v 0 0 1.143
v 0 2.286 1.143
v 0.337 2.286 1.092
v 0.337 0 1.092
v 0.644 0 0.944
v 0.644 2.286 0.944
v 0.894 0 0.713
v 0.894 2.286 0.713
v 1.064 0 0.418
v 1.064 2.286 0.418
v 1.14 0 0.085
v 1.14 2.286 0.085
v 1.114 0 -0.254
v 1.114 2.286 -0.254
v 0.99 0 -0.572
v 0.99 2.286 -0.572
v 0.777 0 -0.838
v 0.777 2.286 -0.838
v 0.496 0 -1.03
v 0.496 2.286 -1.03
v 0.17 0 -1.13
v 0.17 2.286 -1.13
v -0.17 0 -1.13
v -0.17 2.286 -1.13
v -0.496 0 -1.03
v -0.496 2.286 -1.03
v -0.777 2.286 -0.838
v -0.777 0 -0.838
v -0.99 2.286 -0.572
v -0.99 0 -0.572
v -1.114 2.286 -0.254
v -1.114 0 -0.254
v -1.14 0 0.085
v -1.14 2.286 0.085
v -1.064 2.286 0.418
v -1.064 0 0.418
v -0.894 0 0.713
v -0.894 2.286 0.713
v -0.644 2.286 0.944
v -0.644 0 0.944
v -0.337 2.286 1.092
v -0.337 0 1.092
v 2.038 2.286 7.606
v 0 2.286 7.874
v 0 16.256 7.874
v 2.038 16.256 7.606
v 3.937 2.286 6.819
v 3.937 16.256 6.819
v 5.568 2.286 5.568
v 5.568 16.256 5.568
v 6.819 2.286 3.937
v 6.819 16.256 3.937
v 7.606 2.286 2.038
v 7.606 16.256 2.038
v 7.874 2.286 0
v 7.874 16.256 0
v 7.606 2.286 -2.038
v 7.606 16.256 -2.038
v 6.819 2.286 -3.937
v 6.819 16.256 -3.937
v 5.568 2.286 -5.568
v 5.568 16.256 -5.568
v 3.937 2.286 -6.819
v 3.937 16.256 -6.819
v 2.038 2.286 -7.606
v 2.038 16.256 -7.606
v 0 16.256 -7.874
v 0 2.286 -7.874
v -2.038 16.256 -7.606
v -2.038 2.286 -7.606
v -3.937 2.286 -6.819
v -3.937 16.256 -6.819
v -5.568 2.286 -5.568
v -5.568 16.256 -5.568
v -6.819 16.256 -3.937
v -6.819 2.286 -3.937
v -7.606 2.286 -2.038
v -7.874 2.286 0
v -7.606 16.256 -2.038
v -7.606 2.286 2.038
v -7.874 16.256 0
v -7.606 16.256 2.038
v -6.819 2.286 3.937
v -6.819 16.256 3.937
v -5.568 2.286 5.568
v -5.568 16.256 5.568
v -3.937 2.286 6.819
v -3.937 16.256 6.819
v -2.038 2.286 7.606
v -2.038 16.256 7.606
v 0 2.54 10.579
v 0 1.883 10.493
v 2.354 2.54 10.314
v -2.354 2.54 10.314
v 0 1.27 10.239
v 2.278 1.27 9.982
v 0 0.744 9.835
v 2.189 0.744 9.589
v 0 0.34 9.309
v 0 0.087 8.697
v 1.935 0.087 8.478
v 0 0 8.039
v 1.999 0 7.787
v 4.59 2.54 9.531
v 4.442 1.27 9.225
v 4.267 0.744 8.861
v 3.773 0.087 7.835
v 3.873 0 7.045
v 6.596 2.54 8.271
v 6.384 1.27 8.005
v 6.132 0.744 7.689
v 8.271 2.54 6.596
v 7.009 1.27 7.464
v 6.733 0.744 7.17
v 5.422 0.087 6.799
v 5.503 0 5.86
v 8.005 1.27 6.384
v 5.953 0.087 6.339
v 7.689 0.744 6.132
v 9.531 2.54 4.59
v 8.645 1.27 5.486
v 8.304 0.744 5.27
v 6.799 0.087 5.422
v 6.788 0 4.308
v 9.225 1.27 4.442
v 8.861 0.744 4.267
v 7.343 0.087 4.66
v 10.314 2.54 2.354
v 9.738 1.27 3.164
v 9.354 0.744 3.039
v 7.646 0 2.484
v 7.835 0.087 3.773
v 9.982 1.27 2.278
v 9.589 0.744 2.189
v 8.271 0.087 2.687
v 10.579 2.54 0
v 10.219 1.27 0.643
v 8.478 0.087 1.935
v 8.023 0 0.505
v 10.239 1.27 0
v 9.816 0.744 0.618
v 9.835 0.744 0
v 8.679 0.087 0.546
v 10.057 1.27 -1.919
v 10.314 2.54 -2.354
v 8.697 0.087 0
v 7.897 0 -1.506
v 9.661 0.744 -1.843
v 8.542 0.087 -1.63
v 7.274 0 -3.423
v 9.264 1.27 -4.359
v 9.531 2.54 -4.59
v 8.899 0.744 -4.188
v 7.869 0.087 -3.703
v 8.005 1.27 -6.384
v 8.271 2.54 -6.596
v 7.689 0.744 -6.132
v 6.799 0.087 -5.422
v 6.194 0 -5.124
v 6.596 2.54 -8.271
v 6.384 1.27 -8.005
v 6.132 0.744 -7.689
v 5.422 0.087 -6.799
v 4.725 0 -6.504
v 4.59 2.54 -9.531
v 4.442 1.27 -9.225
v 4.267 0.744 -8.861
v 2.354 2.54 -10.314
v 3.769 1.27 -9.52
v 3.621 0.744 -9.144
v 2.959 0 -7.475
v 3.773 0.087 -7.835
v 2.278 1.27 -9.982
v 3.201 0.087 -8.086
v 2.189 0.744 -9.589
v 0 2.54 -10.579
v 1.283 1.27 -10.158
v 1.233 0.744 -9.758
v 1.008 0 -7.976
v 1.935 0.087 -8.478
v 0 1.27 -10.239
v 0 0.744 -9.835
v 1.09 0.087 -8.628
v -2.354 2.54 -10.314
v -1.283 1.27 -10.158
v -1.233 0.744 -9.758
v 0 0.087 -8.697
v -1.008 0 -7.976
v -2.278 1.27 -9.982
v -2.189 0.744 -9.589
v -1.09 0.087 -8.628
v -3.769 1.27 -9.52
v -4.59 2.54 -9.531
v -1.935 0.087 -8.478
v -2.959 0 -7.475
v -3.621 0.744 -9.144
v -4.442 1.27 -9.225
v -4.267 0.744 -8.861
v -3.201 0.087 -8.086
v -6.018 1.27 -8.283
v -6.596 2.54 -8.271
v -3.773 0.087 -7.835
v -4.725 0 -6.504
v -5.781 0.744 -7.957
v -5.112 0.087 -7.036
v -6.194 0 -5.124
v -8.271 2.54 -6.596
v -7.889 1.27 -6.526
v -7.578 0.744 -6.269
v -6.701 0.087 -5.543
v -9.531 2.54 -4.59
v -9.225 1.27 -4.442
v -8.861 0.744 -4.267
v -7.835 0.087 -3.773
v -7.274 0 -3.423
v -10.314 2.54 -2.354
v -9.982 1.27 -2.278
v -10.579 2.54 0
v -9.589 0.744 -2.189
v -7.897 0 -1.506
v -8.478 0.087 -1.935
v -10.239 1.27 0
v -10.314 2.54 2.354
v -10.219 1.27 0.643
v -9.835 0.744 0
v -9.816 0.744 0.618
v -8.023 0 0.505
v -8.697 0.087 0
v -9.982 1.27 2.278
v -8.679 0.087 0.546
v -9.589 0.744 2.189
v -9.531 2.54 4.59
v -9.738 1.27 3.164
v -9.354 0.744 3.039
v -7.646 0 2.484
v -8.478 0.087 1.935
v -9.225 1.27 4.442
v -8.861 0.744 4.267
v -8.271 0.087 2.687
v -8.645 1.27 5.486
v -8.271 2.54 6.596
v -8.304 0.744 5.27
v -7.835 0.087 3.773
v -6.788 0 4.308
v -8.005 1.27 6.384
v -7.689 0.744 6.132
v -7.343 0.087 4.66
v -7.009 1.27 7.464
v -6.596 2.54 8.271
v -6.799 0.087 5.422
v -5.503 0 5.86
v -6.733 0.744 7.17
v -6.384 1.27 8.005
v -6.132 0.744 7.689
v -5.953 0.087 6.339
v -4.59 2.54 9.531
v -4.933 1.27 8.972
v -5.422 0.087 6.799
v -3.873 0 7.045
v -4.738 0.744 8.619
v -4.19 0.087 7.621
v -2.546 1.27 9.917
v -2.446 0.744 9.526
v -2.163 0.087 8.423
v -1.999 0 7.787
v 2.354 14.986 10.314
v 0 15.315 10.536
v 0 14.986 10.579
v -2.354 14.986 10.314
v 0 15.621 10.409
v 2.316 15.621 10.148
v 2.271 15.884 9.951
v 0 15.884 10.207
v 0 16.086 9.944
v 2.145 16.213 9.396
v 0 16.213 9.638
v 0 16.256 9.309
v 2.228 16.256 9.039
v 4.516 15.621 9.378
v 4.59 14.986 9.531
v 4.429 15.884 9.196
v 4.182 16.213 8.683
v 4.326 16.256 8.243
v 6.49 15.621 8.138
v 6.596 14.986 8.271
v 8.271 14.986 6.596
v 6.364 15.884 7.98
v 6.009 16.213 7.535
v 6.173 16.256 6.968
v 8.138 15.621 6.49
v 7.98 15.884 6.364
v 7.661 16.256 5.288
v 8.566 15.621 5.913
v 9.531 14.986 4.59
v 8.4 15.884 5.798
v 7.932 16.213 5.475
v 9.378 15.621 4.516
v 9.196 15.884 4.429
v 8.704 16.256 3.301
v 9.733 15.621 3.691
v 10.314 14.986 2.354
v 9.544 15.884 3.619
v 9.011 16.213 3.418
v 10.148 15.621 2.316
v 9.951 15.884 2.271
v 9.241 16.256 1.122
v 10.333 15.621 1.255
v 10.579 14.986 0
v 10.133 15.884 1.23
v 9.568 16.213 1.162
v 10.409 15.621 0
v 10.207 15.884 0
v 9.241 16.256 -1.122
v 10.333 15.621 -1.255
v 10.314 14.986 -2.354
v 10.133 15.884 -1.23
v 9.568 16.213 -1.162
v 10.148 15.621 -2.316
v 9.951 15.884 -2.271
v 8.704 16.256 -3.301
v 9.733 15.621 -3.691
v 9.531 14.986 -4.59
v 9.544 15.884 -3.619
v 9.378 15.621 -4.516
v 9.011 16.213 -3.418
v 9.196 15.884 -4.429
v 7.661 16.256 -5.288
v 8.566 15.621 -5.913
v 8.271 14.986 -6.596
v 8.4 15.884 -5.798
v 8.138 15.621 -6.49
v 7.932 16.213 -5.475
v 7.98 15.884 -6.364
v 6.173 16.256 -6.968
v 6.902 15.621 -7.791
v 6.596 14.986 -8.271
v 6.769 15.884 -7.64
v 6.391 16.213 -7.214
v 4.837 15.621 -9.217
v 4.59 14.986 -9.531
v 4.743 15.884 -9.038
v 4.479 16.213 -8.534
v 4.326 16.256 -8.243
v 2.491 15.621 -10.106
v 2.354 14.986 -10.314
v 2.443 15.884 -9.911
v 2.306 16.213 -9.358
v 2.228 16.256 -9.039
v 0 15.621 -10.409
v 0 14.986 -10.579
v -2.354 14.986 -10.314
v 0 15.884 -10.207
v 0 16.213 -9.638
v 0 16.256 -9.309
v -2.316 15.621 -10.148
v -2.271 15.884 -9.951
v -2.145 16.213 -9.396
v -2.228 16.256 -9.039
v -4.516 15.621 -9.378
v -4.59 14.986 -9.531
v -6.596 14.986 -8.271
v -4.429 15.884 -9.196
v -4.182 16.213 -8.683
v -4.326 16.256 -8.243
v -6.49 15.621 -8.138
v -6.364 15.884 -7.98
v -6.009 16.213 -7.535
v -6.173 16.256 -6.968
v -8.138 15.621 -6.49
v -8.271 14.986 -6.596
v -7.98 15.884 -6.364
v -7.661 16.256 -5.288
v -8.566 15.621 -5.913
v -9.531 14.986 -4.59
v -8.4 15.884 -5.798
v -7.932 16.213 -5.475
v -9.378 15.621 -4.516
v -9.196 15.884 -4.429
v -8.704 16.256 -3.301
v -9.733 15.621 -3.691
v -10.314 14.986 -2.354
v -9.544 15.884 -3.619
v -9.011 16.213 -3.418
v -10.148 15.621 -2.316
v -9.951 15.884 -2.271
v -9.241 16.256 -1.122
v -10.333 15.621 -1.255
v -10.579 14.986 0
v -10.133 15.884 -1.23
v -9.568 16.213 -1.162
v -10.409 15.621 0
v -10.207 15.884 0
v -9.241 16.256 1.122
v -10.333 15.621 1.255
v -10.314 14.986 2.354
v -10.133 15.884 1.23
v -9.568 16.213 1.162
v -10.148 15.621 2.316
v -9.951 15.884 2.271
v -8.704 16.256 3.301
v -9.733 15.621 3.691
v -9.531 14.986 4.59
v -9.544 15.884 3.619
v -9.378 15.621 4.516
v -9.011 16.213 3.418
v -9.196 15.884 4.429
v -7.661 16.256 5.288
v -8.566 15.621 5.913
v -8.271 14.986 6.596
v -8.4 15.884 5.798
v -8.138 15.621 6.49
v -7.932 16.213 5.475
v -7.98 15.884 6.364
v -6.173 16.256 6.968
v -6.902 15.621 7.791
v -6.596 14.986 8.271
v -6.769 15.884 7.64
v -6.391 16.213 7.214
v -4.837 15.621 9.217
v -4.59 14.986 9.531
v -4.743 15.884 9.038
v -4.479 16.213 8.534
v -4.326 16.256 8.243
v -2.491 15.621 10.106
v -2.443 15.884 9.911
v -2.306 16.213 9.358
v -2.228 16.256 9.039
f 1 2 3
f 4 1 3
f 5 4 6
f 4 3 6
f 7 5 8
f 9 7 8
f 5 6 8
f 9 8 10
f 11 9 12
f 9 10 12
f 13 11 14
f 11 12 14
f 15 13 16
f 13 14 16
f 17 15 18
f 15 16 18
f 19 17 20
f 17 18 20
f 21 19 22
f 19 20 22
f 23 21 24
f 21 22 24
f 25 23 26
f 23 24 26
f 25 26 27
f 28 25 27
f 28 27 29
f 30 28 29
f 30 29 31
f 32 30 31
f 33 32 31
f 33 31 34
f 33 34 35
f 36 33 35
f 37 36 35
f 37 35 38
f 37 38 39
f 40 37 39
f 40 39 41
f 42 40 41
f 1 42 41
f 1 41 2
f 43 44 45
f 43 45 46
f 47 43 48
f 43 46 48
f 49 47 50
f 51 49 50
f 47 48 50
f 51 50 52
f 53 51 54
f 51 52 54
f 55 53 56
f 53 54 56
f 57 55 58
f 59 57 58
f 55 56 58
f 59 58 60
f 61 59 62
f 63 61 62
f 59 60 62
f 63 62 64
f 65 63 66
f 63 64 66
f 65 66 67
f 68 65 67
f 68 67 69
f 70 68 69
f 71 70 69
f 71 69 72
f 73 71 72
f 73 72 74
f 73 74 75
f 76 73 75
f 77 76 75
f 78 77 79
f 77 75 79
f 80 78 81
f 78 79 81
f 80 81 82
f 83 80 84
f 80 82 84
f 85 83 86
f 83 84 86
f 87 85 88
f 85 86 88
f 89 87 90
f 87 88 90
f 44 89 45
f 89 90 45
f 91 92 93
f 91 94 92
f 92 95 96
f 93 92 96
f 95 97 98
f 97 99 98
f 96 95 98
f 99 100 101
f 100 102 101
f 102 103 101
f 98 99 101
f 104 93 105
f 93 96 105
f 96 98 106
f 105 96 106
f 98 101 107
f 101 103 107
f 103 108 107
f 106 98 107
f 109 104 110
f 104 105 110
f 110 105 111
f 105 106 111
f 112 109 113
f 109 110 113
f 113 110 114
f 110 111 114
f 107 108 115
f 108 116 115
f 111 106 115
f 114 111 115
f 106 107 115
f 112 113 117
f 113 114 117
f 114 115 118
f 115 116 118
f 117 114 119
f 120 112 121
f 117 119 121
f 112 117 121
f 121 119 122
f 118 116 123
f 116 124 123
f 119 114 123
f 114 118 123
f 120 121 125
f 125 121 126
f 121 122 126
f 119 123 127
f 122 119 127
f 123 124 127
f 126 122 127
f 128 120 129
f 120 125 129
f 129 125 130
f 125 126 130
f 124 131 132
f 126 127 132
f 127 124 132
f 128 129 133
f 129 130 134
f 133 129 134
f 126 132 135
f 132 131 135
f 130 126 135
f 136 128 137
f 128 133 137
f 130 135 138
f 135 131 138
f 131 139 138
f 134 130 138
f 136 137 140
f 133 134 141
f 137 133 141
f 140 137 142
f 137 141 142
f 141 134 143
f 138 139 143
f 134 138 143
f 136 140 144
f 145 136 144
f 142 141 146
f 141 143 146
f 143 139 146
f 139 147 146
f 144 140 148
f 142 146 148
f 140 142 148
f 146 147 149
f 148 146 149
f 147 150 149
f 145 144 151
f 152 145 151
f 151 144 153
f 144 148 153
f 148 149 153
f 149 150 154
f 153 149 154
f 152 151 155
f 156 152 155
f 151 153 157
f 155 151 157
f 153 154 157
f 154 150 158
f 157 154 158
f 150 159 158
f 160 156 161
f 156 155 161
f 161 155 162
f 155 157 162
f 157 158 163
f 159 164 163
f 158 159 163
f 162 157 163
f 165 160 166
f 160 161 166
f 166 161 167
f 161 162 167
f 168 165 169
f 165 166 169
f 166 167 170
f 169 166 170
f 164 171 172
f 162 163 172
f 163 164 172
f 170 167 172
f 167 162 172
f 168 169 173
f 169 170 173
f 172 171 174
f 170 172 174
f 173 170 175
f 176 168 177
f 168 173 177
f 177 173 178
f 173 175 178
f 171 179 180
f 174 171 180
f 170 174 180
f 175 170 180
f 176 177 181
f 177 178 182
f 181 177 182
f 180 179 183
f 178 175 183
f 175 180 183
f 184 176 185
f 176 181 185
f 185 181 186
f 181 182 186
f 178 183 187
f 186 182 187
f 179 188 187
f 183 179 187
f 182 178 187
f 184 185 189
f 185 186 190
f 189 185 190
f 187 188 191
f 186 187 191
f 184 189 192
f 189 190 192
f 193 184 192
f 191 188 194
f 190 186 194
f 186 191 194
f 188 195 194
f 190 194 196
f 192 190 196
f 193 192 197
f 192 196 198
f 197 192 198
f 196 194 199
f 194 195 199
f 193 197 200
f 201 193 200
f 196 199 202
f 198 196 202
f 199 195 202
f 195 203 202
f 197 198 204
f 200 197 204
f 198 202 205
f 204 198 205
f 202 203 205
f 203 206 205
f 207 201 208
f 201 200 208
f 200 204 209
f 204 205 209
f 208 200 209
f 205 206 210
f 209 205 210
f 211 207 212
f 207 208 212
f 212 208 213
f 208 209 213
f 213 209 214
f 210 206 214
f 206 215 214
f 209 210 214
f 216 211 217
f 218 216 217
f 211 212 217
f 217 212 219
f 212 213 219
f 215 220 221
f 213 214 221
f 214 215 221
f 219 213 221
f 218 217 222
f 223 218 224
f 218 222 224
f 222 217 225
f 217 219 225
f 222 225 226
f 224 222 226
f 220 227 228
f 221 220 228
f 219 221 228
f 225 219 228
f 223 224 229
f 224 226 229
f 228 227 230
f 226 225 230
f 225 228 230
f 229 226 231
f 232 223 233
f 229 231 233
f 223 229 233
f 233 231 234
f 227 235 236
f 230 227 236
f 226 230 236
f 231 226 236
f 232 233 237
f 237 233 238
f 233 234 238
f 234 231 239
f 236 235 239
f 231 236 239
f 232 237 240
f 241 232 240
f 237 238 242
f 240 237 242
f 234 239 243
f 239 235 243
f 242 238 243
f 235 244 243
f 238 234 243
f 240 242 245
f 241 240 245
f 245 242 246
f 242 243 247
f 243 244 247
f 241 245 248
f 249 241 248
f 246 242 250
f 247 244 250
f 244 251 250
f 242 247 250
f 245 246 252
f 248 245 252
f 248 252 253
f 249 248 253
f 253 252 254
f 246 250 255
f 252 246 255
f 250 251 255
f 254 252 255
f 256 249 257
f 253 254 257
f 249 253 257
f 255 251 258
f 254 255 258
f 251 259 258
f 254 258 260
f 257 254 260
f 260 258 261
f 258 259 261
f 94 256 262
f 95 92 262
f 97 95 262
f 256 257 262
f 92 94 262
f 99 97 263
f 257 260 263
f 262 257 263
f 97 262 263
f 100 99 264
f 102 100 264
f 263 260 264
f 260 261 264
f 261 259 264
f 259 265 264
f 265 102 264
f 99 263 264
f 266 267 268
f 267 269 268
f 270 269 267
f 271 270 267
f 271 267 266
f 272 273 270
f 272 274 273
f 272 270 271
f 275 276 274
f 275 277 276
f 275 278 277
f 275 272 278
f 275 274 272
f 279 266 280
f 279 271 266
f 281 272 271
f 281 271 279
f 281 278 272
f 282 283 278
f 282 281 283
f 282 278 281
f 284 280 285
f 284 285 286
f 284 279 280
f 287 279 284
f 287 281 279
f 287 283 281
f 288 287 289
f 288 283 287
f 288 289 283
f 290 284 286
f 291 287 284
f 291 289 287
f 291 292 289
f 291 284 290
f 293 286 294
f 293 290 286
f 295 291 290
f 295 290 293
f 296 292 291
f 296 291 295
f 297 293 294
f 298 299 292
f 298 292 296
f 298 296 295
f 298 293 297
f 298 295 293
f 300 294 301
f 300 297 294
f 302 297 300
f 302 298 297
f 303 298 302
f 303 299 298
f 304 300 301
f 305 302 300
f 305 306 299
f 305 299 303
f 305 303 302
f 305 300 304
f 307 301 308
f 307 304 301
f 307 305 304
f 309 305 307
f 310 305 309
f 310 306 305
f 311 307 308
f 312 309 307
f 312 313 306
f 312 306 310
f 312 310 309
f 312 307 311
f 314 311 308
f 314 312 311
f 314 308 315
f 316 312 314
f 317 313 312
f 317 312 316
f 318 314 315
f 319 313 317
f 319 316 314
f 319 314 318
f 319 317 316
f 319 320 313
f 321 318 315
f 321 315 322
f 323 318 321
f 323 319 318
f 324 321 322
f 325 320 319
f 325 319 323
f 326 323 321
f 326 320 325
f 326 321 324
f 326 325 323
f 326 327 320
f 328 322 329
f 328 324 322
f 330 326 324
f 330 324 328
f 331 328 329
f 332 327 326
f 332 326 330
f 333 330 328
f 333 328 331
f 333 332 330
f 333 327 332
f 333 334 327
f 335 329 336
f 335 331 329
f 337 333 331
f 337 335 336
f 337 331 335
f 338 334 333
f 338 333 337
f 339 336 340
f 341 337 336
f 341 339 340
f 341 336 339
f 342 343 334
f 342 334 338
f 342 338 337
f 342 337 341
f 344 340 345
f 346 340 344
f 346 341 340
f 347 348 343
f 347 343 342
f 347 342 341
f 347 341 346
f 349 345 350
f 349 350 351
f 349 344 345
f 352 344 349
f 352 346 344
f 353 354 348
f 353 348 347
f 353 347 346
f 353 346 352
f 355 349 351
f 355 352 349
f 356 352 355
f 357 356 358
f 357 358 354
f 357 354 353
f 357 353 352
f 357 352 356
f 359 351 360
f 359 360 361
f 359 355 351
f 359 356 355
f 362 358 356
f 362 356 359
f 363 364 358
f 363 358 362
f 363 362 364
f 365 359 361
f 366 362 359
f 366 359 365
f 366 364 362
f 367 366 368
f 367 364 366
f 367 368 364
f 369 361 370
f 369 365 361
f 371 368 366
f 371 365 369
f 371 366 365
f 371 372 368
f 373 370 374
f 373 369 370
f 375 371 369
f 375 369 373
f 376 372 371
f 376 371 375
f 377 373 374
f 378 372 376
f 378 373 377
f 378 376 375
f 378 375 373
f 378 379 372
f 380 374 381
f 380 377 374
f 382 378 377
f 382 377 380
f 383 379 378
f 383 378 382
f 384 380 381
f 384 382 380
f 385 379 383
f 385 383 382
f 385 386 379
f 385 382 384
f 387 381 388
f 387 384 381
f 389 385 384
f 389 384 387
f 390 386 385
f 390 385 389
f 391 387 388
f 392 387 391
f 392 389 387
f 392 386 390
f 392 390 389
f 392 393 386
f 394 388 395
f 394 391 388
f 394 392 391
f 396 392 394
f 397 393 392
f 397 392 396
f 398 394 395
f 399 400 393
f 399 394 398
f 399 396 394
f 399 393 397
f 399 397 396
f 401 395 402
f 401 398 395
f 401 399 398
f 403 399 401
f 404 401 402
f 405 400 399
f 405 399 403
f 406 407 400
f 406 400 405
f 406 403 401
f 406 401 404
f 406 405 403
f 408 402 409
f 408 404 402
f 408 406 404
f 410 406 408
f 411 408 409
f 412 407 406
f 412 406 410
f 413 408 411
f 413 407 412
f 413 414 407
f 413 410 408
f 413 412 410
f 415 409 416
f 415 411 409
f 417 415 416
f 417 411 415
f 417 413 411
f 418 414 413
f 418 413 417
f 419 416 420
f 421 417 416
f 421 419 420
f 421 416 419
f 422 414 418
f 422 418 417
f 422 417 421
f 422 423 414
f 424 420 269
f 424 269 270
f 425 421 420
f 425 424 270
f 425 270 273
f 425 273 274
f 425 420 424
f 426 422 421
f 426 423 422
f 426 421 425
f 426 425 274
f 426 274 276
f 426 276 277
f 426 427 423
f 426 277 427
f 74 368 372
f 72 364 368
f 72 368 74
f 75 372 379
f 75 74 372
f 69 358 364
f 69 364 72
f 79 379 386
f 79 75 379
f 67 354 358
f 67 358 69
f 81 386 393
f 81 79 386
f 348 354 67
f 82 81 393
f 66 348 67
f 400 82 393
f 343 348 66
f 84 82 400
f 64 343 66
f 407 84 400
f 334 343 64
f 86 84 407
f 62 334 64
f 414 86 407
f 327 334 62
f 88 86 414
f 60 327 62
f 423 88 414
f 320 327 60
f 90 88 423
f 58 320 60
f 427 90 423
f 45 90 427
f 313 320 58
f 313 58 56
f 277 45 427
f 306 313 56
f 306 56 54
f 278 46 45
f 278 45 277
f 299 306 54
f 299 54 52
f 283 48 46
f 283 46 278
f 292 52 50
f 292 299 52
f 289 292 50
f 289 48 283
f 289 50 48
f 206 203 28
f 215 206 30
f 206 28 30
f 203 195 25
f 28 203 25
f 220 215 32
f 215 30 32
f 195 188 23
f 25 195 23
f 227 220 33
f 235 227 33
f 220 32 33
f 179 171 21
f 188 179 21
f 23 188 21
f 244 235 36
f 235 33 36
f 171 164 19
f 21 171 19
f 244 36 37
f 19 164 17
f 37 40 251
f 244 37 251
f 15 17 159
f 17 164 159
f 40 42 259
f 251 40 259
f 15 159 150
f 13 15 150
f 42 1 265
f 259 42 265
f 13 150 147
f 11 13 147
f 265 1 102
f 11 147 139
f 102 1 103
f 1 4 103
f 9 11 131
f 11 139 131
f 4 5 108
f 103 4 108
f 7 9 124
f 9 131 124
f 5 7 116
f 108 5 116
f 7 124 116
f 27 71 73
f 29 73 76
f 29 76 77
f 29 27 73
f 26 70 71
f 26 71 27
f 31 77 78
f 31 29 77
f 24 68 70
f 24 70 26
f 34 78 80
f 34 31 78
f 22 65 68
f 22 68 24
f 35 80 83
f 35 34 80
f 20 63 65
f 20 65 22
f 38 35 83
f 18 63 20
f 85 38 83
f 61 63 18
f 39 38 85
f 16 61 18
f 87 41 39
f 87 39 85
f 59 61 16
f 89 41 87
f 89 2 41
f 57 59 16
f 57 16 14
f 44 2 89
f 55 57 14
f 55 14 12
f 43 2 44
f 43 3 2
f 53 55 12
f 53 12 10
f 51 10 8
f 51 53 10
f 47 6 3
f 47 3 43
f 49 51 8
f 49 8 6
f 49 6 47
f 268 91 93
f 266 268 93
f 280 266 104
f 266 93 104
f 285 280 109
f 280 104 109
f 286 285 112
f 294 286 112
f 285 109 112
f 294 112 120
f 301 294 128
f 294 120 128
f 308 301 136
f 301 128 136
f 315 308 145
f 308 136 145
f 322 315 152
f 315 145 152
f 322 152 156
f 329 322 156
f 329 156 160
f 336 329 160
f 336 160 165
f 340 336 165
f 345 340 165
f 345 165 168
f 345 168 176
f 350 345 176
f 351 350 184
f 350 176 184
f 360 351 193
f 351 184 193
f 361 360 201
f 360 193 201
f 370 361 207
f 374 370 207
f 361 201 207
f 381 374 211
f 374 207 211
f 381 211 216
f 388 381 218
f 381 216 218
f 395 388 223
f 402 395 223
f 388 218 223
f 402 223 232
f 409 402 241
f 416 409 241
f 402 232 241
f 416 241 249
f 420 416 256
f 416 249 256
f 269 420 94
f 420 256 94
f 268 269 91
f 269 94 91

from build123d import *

# Parameters (mm, degrees)
SKETCH1_R           = 10.5791
BOSS_EXTRUDE1_DEPTH = 16.256
SKETCH2_R           = 7.874
CUT_EXTRUDE1_DEPTH  = 13.97
FILLET1_R           = 1.27
FILLET2_R           = 2.54
SKETCH4_R           = 1.143
CUT_EXTRUDE2_DEPTH  = 21.469382398


with BuildPart() as part:
    # Sketch1 → Boss-Extrude1 (new body)
    with BuildSketch(Plane(origin=(0, 0, 0), x_dir=(1, 0, 0), z_dir=(0, 1, 0))):
        with Locations(Location((0, 0, 0), (0, 0, 270))):
            Circle(SKETCH1_R)
    extrude(amount=BOSS_EXTRUDE1_DEPTH)

    # Sketch2 → Cut-Extrude1 (cut)
    with BuildSketch(Plane(origin=(0, 16.256, 0), x_dir=(1, 0, 0), z_dir=(0, 1, 0))):
        with Locations(Location((0, 0, 0), (0, 0, 270))):
            Circle(SKETCH2_R)
    extrude(amount=-CUT_EXTRUDE1_DEPTH, mode=Mode.SUBTRACT)

    # Fillet1
    fillet1_edges = [part.edges().sort_by_distance(p)[0] for p in [
        (0, 16.256, -10.5791),
    ]]
    fillet(fillet1_edges, radius=FILLET1_R)

    # Fillet2
    fillet2_edges = [part.edges().sort_by_distance(p)[0] for p in [
        (0, 0, -10.5791),
    ]]
    fillet(fillet2_edges, radius=FILLET2_R)

    # Sketch4 → Cut-Extrude2 (cut, through all)
    with BuildSketch(Plane(origin=(0, 2.286, 0), x_dir=(1, 0, 0), z_dir=(0, 1, 0))):
        with Locations(Location((0, 0, 0), (0, 0, 270))):
            Circle(SKETCH4_R)
    extrude(amount=-CUT_EXTRUDE2_DEPTH, mode=Mode.SUBTRACT)


solid = part.part
